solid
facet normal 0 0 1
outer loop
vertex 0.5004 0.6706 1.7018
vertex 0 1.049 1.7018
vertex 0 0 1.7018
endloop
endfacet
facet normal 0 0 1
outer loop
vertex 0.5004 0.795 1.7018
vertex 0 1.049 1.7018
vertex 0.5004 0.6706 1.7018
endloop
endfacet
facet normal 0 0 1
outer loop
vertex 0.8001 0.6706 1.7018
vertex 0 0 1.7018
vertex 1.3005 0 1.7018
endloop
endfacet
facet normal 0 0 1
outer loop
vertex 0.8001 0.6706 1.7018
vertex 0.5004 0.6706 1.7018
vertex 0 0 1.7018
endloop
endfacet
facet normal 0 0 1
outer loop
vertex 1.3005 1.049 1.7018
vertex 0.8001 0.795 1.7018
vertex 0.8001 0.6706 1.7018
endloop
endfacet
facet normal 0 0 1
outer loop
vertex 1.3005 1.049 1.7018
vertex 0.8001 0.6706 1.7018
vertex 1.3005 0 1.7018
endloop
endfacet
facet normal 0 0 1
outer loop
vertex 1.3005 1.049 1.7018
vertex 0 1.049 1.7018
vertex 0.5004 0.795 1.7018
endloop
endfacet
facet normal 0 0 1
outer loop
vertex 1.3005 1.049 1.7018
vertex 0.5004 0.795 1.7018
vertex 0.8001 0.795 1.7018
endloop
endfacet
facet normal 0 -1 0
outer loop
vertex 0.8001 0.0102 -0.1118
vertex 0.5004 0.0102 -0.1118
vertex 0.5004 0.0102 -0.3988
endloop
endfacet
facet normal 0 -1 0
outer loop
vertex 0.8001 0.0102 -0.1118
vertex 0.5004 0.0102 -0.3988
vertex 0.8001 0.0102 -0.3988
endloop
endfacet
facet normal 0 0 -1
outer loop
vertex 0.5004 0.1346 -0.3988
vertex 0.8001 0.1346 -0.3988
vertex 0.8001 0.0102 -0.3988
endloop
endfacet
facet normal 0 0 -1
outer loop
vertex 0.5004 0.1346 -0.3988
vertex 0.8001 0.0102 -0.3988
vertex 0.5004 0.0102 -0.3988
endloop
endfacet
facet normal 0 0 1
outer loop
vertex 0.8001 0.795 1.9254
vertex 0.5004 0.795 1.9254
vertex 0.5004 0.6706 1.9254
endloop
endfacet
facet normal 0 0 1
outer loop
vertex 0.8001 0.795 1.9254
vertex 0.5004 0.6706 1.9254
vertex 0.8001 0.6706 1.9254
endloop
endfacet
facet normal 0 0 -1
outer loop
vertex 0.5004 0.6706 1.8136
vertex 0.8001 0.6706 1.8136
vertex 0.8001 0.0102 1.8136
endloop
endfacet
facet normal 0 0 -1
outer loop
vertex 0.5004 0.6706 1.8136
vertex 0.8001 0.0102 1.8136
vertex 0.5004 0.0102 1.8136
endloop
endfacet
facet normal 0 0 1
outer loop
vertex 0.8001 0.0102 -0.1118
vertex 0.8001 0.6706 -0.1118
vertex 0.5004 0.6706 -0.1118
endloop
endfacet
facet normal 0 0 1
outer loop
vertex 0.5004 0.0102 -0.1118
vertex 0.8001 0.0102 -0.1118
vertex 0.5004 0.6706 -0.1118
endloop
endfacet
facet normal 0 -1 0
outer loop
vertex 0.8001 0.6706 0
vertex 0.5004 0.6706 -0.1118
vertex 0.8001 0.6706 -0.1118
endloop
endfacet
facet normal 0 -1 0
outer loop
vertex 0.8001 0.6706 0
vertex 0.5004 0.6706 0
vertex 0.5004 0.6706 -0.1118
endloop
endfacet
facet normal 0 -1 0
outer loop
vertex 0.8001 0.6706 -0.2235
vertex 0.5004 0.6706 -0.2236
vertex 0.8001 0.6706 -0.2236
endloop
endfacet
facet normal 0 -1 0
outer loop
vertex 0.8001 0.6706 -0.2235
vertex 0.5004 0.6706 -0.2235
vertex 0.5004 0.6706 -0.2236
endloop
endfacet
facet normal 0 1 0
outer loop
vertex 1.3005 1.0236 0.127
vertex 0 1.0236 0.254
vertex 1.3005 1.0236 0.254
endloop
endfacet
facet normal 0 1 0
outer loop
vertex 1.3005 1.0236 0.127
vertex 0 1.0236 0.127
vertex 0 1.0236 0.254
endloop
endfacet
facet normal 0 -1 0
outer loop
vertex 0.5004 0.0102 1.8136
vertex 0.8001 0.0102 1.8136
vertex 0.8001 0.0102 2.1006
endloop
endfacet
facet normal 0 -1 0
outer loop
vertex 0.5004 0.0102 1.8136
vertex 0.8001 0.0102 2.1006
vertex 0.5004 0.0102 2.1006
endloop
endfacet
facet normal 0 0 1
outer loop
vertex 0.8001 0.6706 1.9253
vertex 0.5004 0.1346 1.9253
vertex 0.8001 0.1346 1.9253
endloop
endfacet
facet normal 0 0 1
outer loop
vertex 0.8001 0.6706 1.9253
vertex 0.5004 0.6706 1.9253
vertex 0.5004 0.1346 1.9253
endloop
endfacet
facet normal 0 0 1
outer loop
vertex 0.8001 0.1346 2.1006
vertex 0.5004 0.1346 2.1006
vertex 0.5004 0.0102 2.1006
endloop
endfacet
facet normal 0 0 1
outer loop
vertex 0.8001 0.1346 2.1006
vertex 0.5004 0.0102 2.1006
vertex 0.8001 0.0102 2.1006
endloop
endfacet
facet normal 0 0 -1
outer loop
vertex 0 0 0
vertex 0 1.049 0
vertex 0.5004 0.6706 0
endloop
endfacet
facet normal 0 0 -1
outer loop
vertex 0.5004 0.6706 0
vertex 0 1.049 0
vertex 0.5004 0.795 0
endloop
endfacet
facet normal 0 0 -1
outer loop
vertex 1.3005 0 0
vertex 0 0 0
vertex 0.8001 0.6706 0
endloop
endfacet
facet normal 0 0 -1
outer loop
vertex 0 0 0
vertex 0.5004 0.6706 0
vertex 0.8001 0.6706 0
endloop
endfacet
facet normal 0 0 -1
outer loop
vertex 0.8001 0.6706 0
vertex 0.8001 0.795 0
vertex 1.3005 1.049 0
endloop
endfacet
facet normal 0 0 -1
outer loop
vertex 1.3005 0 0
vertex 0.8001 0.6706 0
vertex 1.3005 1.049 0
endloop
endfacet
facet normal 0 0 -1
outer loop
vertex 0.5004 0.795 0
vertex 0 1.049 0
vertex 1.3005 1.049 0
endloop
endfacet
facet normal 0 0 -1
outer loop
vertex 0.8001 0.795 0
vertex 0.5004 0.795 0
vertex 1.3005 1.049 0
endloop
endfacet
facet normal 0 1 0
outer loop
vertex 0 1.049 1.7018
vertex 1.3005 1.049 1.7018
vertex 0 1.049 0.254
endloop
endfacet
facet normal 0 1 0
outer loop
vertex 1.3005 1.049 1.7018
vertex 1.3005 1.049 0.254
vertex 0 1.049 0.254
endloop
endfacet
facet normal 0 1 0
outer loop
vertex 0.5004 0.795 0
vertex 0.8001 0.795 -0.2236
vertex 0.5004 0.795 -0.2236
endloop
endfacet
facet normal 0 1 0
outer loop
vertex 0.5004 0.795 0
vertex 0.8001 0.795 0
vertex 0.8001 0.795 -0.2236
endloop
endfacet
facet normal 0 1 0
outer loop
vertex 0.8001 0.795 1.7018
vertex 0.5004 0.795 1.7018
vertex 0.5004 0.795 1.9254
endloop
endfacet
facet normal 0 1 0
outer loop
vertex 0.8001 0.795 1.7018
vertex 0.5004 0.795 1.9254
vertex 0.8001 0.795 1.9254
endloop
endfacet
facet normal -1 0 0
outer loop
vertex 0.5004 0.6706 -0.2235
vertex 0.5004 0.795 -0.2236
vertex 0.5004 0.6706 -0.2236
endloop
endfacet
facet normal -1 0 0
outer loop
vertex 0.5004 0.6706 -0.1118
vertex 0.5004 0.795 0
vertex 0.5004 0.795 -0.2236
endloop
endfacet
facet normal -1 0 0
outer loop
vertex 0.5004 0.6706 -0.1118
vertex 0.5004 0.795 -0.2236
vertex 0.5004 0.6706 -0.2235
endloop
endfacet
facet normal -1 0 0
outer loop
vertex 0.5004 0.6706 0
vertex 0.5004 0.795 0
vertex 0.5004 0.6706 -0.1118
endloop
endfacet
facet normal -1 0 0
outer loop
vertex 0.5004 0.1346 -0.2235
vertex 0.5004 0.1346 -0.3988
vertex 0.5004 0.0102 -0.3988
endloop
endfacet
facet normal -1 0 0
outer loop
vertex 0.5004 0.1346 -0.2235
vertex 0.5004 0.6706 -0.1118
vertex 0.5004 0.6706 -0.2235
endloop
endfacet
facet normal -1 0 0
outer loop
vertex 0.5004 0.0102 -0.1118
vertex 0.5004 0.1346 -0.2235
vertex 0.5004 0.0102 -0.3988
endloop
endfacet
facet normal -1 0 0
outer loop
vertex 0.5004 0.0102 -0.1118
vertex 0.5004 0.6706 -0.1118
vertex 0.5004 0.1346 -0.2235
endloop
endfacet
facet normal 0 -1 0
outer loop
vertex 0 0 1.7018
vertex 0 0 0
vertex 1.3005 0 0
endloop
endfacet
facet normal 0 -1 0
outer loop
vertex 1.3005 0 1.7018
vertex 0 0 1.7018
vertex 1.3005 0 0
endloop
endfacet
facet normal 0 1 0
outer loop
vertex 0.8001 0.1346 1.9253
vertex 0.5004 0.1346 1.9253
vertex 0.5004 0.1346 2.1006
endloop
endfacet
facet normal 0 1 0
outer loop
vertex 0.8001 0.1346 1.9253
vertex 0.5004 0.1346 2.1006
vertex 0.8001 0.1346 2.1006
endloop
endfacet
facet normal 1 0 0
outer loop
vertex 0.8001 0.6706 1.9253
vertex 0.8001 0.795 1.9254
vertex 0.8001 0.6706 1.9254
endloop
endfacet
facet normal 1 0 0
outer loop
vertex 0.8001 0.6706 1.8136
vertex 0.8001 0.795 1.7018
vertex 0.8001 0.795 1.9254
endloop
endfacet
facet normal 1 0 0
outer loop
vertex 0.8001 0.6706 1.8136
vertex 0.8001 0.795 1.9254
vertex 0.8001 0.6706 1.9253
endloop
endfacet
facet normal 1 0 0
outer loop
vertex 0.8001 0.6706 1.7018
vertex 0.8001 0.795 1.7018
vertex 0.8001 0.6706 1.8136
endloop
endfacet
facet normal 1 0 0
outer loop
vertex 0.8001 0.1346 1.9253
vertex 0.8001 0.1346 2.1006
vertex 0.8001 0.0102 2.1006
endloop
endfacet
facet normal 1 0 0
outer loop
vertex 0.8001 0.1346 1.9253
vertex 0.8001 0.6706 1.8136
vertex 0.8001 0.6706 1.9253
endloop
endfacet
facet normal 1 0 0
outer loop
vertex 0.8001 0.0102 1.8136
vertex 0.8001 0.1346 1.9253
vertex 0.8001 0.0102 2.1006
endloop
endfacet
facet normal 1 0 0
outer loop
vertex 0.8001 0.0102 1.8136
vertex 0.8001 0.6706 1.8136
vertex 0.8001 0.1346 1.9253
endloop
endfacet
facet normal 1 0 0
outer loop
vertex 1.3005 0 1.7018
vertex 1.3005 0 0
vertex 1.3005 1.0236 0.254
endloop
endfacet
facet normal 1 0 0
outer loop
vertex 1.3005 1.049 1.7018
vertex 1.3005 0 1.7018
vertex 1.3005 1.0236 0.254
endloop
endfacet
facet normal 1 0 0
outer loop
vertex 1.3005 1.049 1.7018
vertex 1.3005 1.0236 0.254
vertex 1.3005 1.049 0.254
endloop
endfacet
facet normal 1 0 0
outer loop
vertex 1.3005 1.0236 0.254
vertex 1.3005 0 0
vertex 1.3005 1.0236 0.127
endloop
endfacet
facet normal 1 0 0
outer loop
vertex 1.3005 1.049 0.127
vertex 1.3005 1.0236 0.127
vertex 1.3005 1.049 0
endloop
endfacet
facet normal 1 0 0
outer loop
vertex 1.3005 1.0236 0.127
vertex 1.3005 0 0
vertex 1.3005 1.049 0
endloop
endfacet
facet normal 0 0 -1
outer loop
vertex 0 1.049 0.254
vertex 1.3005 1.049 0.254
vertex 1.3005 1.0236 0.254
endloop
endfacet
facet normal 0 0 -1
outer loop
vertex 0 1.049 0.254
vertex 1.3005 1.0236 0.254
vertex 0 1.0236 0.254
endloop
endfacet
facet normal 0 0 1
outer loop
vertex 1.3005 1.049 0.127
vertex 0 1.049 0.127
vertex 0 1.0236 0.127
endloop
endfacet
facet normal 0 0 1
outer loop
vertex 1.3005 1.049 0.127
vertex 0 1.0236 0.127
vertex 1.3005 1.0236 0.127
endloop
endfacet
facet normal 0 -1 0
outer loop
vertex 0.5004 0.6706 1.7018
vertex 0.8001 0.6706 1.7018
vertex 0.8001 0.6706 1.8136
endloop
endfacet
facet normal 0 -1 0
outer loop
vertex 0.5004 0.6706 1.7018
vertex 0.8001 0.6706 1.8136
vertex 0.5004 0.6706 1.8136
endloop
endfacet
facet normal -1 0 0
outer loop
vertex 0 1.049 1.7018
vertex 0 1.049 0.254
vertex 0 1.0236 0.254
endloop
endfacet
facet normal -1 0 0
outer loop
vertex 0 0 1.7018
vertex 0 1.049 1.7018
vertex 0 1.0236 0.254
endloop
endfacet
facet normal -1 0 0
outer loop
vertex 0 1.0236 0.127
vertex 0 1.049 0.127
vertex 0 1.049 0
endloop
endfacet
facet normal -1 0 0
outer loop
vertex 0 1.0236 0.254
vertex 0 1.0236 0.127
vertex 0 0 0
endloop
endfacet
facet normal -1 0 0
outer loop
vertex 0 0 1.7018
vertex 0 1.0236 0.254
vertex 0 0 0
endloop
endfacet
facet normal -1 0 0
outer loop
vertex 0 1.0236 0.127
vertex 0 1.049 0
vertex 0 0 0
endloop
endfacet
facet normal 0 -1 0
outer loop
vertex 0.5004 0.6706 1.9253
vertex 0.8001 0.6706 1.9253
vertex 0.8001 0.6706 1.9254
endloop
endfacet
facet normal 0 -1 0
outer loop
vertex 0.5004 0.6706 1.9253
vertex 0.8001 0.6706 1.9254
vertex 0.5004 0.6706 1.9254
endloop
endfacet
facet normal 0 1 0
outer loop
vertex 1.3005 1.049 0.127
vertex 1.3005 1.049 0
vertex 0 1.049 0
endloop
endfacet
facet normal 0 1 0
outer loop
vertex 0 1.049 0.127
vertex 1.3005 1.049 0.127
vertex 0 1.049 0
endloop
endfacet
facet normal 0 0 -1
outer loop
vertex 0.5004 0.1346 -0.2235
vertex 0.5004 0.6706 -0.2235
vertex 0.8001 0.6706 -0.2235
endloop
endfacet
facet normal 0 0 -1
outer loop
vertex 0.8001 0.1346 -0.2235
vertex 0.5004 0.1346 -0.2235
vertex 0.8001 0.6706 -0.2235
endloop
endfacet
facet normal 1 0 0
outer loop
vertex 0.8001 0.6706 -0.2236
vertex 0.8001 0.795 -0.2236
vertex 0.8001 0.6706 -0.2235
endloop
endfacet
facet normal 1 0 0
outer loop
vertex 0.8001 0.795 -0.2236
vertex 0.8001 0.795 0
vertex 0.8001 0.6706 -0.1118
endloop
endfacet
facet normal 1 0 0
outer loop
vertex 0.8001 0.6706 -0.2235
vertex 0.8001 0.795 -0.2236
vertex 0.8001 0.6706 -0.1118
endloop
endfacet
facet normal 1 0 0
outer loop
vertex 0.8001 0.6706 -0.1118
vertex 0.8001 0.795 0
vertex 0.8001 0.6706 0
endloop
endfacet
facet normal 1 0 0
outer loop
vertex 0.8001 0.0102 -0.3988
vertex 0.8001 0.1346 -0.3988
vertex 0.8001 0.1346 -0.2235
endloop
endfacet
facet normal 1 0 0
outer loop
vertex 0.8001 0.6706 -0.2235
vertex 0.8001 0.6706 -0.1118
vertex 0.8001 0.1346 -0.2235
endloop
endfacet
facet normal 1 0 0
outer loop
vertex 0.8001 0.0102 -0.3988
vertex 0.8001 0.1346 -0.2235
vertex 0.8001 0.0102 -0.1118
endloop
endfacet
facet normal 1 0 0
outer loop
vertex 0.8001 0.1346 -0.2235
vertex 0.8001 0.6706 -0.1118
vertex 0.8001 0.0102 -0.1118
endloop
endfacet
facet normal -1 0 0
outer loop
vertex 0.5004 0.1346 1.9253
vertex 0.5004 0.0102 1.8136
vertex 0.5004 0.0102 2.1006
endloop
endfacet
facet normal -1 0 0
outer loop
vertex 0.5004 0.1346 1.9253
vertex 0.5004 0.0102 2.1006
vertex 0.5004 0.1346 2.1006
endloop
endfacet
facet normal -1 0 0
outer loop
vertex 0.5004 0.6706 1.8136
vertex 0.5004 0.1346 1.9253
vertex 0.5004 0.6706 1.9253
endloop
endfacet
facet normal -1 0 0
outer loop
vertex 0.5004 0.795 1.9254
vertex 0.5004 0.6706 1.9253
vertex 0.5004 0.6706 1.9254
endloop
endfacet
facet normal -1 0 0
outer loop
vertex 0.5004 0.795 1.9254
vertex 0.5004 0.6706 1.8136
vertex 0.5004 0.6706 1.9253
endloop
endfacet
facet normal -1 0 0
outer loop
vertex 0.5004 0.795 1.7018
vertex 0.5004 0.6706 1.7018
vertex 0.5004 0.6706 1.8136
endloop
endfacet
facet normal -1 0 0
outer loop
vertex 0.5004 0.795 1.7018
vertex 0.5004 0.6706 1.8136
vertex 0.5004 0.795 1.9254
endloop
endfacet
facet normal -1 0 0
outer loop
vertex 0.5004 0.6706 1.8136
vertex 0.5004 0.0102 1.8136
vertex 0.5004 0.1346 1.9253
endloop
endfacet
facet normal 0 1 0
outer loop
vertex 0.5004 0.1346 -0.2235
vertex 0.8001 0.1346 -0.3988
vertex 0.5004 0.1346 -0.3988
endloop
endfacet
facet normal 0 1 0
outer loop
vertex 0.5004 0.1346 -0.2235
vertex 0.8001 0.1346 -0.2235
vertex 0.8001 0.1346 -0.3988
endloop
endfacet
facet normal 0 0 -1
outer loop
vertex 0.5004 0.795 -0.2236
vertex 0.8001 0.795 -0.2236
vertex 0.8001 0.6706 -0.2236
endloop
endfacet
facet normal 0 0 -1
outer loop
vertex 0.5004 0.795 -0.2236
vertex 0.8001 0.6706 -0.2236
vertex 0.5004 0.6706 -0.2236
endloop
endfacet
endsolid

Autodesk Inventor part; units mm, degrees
ref_plane "YZ Plane" through (0, 0, 0) normal (1, 0, 0) x (0, 1, 0)
ref_plane "XZ Plane" through (0, 0, 0) normal (0, 1, 0) x (-1, 0, 0)
ref_plane "XY Plane" through (0, 0, 0) normal (0, 0, 1) x (1, 0, 0)
sketch "Sketch1" plane through (0, 0, 0) normal (0, 0, 1) x (1, 0, 0)
  line L0 (0, 0) -> (1.3005, 0)
  line L1 (1.3005, 0) -> (1.3005, 1.049)
  line L2 (1.3005, 1.049) -> (0, 1.049)
  line L3 (0, 1.049) -> (0, 0)
  dimension "d0" = 1.049
  dimension "d1" = 1.3005
extrude "Extrusion1" add sketch "Sketch1" along normal blind 1.7018
sketch "Sketch2" plane through (0, 0, 1.7018) normal (0, 0, 1) x (1, 0, 0)
  line L0 (0.5004, 0.795) -> (0.8001, 0.795)
  line L1 (0.8001, 0.795) -> (0.8001, 0.6706)
  line L2 (0.8001, 0.6706) -> (0.5004, 0.6706)
  line L3 (0.5004, 0.6706) -> (0.5004, 0.795)
  line L4 (0, 1.049) -> (0, 0) projected
  line L5 (1.3005, 1.049) -> (0, 1.049) projected
  dimension "d4" = 0.2997
  dimension "d5" = 0.5004
  dimension "d6" = 0.254
  dimension "d7" = 0.1245
extrude "Extrusion2" add sketch "Sketch2" against normal blind 1.8009
extrude "Extrusion3" add sketch "Sketch2" along normal blind 0.0991
sketch "Sketch3" plane through (0, 0, 1.8009) normal (0, 0, 1) x (1, 0, 0)
  line L0 (0.5004, 0.795) -> (0.8001, 0.795)
  line L1 (0.8001, 0.795) -> (0.8001, 0.6706)
  line L2 (0.8001, 0.6706) -> (0.5004, 0.6706)
  line L3 (0.5004, 0.6706) -> (0.5004, 0.795)
  point P0 (0, 0)
extrude "Extrusion4" add sketch "Sketch3" along normal blind 0.1245
sketch "Sketch4" plane through (0, 0, -0.0991) normal (0, 0, -1) x (-1, 0, 0)
  line L0 (-0.8001, 0.795) -> (-0.5004, 0.795)
  line L1 (-0.5004, 0.795) -> (-0.5004, 0.6706)
  line L2 (-0.5004, 0.6706) -> (-0.8001, 0.6706)
  line L3 (-0.8001, 0.6706) -> (-0.8001, 0.795)
  point P0 (0, 0)
extrude "Extrusion5" add sketch "Sketch4" along normal blind 0.1245
sketch "Sketch5" plane through (0.5004, 0.6706, 0) normal (0, -1, 0) x (1, 0, 0)
  line L0 (0.2997, 0) -> (0.2997, -0.2235) projected
  line L1 (0, -0.2235) -> (0.2997, -0.2235)
  line L2 (0.2997, -0.2235) -> (0.2997, -0.1118)
  line L3 (0.2997, -0.1118) -> (0, -0.1118)
  line L4 (0, -0.1118) -> (0, -0.2235)
  line L5 (0.2997, 1.7018) -> (0.2997, 1.9253) projected
  line L6 (0, 1.9253) -> (0.2997, 1.9253)
  line L7 (0.2997, 1.9253) -> (0.2997, 1.8136)
  line L8 (0.2997, 1.8136) -> (0, 1.8136)
  line L9 (0, 1.8136) -> (0, 1.9253)
  point P0 (-0.5004, 0)
extrude "Extrusion6" add sketch "Sketch5" along normal blind 0.6604
sketch "Sketch6" plane through (0, 0, -0.2235) normal (0, 0, -1) x (-1, 0, 0)
  line L0 (-0.8001, 0.795) -> (-0.8001, 0.0102) projected
  line L1 (-0.5004, 0.0102) -> (-0.8001, 0.0102)
  line L2 (-0.8001, 0.0102) -> (-0.8001, 0.1346)
  line L3 (-0.8001, 0.1346) -> (-0.5004, 0.1346)
  line L4 (-0.5004, 0.1346) -> (-0.5004, 0.0102)
  point P0 (0, 0)
  dimension "d18" = 0.1245
extrude "Extrusion7" add sketch "Sketch6" along normal blind 0.1753
sketch "Sketch7" plane through (0, 0, 1.9253) normal (0, 0, 1) x (1, 0, 0)
  line L0 (0.8001, 0.0102) -> (0.5004, 0.0102)
  line L1 (0.5004, 0.0102) -> (0.5004, 0.1346)
  line L2 (0.5004, 0.1346) -> (0.8001, 0.1346)
  line L3 (0.8001, 0.1346) -> (0.8001, 0.0102)
  point P0 (0, 0)
extrude "Extrusion8" add sketch "Sketch7" along normal blind 0.1753
sketch "Sketch8" plane through (0, 1.049, 0) normal (0, 1, 0) x (1, 0, 0)
  line L0 (0, 0) -> (0, -1.7018) projected
  line L1 (0, -0.127) -> (1.3005, -0.127)
  line L2 (1.3005, -0.127) -> (1.3005, -0.254)
  line L3 (1.3005, -0.254) -> (0, -0.254)
  line L4 (0, -0.254) -> (0, -0.127)
  line L5 (1.3005, 0) -> (0, 0) projected
  line L6 (1.3005, 0) -> (1.3005, -1.7018) projected
  dimension "d23" = 0.127
  dimension "d24" = 0.127
  dimension "d25" = 0
extrude "Extrusion9" cut sketch "Sketch8" against normal blind 0.0254 contours L1 L2 L3 L0
properties part number "s0.57A 10V Diode"
